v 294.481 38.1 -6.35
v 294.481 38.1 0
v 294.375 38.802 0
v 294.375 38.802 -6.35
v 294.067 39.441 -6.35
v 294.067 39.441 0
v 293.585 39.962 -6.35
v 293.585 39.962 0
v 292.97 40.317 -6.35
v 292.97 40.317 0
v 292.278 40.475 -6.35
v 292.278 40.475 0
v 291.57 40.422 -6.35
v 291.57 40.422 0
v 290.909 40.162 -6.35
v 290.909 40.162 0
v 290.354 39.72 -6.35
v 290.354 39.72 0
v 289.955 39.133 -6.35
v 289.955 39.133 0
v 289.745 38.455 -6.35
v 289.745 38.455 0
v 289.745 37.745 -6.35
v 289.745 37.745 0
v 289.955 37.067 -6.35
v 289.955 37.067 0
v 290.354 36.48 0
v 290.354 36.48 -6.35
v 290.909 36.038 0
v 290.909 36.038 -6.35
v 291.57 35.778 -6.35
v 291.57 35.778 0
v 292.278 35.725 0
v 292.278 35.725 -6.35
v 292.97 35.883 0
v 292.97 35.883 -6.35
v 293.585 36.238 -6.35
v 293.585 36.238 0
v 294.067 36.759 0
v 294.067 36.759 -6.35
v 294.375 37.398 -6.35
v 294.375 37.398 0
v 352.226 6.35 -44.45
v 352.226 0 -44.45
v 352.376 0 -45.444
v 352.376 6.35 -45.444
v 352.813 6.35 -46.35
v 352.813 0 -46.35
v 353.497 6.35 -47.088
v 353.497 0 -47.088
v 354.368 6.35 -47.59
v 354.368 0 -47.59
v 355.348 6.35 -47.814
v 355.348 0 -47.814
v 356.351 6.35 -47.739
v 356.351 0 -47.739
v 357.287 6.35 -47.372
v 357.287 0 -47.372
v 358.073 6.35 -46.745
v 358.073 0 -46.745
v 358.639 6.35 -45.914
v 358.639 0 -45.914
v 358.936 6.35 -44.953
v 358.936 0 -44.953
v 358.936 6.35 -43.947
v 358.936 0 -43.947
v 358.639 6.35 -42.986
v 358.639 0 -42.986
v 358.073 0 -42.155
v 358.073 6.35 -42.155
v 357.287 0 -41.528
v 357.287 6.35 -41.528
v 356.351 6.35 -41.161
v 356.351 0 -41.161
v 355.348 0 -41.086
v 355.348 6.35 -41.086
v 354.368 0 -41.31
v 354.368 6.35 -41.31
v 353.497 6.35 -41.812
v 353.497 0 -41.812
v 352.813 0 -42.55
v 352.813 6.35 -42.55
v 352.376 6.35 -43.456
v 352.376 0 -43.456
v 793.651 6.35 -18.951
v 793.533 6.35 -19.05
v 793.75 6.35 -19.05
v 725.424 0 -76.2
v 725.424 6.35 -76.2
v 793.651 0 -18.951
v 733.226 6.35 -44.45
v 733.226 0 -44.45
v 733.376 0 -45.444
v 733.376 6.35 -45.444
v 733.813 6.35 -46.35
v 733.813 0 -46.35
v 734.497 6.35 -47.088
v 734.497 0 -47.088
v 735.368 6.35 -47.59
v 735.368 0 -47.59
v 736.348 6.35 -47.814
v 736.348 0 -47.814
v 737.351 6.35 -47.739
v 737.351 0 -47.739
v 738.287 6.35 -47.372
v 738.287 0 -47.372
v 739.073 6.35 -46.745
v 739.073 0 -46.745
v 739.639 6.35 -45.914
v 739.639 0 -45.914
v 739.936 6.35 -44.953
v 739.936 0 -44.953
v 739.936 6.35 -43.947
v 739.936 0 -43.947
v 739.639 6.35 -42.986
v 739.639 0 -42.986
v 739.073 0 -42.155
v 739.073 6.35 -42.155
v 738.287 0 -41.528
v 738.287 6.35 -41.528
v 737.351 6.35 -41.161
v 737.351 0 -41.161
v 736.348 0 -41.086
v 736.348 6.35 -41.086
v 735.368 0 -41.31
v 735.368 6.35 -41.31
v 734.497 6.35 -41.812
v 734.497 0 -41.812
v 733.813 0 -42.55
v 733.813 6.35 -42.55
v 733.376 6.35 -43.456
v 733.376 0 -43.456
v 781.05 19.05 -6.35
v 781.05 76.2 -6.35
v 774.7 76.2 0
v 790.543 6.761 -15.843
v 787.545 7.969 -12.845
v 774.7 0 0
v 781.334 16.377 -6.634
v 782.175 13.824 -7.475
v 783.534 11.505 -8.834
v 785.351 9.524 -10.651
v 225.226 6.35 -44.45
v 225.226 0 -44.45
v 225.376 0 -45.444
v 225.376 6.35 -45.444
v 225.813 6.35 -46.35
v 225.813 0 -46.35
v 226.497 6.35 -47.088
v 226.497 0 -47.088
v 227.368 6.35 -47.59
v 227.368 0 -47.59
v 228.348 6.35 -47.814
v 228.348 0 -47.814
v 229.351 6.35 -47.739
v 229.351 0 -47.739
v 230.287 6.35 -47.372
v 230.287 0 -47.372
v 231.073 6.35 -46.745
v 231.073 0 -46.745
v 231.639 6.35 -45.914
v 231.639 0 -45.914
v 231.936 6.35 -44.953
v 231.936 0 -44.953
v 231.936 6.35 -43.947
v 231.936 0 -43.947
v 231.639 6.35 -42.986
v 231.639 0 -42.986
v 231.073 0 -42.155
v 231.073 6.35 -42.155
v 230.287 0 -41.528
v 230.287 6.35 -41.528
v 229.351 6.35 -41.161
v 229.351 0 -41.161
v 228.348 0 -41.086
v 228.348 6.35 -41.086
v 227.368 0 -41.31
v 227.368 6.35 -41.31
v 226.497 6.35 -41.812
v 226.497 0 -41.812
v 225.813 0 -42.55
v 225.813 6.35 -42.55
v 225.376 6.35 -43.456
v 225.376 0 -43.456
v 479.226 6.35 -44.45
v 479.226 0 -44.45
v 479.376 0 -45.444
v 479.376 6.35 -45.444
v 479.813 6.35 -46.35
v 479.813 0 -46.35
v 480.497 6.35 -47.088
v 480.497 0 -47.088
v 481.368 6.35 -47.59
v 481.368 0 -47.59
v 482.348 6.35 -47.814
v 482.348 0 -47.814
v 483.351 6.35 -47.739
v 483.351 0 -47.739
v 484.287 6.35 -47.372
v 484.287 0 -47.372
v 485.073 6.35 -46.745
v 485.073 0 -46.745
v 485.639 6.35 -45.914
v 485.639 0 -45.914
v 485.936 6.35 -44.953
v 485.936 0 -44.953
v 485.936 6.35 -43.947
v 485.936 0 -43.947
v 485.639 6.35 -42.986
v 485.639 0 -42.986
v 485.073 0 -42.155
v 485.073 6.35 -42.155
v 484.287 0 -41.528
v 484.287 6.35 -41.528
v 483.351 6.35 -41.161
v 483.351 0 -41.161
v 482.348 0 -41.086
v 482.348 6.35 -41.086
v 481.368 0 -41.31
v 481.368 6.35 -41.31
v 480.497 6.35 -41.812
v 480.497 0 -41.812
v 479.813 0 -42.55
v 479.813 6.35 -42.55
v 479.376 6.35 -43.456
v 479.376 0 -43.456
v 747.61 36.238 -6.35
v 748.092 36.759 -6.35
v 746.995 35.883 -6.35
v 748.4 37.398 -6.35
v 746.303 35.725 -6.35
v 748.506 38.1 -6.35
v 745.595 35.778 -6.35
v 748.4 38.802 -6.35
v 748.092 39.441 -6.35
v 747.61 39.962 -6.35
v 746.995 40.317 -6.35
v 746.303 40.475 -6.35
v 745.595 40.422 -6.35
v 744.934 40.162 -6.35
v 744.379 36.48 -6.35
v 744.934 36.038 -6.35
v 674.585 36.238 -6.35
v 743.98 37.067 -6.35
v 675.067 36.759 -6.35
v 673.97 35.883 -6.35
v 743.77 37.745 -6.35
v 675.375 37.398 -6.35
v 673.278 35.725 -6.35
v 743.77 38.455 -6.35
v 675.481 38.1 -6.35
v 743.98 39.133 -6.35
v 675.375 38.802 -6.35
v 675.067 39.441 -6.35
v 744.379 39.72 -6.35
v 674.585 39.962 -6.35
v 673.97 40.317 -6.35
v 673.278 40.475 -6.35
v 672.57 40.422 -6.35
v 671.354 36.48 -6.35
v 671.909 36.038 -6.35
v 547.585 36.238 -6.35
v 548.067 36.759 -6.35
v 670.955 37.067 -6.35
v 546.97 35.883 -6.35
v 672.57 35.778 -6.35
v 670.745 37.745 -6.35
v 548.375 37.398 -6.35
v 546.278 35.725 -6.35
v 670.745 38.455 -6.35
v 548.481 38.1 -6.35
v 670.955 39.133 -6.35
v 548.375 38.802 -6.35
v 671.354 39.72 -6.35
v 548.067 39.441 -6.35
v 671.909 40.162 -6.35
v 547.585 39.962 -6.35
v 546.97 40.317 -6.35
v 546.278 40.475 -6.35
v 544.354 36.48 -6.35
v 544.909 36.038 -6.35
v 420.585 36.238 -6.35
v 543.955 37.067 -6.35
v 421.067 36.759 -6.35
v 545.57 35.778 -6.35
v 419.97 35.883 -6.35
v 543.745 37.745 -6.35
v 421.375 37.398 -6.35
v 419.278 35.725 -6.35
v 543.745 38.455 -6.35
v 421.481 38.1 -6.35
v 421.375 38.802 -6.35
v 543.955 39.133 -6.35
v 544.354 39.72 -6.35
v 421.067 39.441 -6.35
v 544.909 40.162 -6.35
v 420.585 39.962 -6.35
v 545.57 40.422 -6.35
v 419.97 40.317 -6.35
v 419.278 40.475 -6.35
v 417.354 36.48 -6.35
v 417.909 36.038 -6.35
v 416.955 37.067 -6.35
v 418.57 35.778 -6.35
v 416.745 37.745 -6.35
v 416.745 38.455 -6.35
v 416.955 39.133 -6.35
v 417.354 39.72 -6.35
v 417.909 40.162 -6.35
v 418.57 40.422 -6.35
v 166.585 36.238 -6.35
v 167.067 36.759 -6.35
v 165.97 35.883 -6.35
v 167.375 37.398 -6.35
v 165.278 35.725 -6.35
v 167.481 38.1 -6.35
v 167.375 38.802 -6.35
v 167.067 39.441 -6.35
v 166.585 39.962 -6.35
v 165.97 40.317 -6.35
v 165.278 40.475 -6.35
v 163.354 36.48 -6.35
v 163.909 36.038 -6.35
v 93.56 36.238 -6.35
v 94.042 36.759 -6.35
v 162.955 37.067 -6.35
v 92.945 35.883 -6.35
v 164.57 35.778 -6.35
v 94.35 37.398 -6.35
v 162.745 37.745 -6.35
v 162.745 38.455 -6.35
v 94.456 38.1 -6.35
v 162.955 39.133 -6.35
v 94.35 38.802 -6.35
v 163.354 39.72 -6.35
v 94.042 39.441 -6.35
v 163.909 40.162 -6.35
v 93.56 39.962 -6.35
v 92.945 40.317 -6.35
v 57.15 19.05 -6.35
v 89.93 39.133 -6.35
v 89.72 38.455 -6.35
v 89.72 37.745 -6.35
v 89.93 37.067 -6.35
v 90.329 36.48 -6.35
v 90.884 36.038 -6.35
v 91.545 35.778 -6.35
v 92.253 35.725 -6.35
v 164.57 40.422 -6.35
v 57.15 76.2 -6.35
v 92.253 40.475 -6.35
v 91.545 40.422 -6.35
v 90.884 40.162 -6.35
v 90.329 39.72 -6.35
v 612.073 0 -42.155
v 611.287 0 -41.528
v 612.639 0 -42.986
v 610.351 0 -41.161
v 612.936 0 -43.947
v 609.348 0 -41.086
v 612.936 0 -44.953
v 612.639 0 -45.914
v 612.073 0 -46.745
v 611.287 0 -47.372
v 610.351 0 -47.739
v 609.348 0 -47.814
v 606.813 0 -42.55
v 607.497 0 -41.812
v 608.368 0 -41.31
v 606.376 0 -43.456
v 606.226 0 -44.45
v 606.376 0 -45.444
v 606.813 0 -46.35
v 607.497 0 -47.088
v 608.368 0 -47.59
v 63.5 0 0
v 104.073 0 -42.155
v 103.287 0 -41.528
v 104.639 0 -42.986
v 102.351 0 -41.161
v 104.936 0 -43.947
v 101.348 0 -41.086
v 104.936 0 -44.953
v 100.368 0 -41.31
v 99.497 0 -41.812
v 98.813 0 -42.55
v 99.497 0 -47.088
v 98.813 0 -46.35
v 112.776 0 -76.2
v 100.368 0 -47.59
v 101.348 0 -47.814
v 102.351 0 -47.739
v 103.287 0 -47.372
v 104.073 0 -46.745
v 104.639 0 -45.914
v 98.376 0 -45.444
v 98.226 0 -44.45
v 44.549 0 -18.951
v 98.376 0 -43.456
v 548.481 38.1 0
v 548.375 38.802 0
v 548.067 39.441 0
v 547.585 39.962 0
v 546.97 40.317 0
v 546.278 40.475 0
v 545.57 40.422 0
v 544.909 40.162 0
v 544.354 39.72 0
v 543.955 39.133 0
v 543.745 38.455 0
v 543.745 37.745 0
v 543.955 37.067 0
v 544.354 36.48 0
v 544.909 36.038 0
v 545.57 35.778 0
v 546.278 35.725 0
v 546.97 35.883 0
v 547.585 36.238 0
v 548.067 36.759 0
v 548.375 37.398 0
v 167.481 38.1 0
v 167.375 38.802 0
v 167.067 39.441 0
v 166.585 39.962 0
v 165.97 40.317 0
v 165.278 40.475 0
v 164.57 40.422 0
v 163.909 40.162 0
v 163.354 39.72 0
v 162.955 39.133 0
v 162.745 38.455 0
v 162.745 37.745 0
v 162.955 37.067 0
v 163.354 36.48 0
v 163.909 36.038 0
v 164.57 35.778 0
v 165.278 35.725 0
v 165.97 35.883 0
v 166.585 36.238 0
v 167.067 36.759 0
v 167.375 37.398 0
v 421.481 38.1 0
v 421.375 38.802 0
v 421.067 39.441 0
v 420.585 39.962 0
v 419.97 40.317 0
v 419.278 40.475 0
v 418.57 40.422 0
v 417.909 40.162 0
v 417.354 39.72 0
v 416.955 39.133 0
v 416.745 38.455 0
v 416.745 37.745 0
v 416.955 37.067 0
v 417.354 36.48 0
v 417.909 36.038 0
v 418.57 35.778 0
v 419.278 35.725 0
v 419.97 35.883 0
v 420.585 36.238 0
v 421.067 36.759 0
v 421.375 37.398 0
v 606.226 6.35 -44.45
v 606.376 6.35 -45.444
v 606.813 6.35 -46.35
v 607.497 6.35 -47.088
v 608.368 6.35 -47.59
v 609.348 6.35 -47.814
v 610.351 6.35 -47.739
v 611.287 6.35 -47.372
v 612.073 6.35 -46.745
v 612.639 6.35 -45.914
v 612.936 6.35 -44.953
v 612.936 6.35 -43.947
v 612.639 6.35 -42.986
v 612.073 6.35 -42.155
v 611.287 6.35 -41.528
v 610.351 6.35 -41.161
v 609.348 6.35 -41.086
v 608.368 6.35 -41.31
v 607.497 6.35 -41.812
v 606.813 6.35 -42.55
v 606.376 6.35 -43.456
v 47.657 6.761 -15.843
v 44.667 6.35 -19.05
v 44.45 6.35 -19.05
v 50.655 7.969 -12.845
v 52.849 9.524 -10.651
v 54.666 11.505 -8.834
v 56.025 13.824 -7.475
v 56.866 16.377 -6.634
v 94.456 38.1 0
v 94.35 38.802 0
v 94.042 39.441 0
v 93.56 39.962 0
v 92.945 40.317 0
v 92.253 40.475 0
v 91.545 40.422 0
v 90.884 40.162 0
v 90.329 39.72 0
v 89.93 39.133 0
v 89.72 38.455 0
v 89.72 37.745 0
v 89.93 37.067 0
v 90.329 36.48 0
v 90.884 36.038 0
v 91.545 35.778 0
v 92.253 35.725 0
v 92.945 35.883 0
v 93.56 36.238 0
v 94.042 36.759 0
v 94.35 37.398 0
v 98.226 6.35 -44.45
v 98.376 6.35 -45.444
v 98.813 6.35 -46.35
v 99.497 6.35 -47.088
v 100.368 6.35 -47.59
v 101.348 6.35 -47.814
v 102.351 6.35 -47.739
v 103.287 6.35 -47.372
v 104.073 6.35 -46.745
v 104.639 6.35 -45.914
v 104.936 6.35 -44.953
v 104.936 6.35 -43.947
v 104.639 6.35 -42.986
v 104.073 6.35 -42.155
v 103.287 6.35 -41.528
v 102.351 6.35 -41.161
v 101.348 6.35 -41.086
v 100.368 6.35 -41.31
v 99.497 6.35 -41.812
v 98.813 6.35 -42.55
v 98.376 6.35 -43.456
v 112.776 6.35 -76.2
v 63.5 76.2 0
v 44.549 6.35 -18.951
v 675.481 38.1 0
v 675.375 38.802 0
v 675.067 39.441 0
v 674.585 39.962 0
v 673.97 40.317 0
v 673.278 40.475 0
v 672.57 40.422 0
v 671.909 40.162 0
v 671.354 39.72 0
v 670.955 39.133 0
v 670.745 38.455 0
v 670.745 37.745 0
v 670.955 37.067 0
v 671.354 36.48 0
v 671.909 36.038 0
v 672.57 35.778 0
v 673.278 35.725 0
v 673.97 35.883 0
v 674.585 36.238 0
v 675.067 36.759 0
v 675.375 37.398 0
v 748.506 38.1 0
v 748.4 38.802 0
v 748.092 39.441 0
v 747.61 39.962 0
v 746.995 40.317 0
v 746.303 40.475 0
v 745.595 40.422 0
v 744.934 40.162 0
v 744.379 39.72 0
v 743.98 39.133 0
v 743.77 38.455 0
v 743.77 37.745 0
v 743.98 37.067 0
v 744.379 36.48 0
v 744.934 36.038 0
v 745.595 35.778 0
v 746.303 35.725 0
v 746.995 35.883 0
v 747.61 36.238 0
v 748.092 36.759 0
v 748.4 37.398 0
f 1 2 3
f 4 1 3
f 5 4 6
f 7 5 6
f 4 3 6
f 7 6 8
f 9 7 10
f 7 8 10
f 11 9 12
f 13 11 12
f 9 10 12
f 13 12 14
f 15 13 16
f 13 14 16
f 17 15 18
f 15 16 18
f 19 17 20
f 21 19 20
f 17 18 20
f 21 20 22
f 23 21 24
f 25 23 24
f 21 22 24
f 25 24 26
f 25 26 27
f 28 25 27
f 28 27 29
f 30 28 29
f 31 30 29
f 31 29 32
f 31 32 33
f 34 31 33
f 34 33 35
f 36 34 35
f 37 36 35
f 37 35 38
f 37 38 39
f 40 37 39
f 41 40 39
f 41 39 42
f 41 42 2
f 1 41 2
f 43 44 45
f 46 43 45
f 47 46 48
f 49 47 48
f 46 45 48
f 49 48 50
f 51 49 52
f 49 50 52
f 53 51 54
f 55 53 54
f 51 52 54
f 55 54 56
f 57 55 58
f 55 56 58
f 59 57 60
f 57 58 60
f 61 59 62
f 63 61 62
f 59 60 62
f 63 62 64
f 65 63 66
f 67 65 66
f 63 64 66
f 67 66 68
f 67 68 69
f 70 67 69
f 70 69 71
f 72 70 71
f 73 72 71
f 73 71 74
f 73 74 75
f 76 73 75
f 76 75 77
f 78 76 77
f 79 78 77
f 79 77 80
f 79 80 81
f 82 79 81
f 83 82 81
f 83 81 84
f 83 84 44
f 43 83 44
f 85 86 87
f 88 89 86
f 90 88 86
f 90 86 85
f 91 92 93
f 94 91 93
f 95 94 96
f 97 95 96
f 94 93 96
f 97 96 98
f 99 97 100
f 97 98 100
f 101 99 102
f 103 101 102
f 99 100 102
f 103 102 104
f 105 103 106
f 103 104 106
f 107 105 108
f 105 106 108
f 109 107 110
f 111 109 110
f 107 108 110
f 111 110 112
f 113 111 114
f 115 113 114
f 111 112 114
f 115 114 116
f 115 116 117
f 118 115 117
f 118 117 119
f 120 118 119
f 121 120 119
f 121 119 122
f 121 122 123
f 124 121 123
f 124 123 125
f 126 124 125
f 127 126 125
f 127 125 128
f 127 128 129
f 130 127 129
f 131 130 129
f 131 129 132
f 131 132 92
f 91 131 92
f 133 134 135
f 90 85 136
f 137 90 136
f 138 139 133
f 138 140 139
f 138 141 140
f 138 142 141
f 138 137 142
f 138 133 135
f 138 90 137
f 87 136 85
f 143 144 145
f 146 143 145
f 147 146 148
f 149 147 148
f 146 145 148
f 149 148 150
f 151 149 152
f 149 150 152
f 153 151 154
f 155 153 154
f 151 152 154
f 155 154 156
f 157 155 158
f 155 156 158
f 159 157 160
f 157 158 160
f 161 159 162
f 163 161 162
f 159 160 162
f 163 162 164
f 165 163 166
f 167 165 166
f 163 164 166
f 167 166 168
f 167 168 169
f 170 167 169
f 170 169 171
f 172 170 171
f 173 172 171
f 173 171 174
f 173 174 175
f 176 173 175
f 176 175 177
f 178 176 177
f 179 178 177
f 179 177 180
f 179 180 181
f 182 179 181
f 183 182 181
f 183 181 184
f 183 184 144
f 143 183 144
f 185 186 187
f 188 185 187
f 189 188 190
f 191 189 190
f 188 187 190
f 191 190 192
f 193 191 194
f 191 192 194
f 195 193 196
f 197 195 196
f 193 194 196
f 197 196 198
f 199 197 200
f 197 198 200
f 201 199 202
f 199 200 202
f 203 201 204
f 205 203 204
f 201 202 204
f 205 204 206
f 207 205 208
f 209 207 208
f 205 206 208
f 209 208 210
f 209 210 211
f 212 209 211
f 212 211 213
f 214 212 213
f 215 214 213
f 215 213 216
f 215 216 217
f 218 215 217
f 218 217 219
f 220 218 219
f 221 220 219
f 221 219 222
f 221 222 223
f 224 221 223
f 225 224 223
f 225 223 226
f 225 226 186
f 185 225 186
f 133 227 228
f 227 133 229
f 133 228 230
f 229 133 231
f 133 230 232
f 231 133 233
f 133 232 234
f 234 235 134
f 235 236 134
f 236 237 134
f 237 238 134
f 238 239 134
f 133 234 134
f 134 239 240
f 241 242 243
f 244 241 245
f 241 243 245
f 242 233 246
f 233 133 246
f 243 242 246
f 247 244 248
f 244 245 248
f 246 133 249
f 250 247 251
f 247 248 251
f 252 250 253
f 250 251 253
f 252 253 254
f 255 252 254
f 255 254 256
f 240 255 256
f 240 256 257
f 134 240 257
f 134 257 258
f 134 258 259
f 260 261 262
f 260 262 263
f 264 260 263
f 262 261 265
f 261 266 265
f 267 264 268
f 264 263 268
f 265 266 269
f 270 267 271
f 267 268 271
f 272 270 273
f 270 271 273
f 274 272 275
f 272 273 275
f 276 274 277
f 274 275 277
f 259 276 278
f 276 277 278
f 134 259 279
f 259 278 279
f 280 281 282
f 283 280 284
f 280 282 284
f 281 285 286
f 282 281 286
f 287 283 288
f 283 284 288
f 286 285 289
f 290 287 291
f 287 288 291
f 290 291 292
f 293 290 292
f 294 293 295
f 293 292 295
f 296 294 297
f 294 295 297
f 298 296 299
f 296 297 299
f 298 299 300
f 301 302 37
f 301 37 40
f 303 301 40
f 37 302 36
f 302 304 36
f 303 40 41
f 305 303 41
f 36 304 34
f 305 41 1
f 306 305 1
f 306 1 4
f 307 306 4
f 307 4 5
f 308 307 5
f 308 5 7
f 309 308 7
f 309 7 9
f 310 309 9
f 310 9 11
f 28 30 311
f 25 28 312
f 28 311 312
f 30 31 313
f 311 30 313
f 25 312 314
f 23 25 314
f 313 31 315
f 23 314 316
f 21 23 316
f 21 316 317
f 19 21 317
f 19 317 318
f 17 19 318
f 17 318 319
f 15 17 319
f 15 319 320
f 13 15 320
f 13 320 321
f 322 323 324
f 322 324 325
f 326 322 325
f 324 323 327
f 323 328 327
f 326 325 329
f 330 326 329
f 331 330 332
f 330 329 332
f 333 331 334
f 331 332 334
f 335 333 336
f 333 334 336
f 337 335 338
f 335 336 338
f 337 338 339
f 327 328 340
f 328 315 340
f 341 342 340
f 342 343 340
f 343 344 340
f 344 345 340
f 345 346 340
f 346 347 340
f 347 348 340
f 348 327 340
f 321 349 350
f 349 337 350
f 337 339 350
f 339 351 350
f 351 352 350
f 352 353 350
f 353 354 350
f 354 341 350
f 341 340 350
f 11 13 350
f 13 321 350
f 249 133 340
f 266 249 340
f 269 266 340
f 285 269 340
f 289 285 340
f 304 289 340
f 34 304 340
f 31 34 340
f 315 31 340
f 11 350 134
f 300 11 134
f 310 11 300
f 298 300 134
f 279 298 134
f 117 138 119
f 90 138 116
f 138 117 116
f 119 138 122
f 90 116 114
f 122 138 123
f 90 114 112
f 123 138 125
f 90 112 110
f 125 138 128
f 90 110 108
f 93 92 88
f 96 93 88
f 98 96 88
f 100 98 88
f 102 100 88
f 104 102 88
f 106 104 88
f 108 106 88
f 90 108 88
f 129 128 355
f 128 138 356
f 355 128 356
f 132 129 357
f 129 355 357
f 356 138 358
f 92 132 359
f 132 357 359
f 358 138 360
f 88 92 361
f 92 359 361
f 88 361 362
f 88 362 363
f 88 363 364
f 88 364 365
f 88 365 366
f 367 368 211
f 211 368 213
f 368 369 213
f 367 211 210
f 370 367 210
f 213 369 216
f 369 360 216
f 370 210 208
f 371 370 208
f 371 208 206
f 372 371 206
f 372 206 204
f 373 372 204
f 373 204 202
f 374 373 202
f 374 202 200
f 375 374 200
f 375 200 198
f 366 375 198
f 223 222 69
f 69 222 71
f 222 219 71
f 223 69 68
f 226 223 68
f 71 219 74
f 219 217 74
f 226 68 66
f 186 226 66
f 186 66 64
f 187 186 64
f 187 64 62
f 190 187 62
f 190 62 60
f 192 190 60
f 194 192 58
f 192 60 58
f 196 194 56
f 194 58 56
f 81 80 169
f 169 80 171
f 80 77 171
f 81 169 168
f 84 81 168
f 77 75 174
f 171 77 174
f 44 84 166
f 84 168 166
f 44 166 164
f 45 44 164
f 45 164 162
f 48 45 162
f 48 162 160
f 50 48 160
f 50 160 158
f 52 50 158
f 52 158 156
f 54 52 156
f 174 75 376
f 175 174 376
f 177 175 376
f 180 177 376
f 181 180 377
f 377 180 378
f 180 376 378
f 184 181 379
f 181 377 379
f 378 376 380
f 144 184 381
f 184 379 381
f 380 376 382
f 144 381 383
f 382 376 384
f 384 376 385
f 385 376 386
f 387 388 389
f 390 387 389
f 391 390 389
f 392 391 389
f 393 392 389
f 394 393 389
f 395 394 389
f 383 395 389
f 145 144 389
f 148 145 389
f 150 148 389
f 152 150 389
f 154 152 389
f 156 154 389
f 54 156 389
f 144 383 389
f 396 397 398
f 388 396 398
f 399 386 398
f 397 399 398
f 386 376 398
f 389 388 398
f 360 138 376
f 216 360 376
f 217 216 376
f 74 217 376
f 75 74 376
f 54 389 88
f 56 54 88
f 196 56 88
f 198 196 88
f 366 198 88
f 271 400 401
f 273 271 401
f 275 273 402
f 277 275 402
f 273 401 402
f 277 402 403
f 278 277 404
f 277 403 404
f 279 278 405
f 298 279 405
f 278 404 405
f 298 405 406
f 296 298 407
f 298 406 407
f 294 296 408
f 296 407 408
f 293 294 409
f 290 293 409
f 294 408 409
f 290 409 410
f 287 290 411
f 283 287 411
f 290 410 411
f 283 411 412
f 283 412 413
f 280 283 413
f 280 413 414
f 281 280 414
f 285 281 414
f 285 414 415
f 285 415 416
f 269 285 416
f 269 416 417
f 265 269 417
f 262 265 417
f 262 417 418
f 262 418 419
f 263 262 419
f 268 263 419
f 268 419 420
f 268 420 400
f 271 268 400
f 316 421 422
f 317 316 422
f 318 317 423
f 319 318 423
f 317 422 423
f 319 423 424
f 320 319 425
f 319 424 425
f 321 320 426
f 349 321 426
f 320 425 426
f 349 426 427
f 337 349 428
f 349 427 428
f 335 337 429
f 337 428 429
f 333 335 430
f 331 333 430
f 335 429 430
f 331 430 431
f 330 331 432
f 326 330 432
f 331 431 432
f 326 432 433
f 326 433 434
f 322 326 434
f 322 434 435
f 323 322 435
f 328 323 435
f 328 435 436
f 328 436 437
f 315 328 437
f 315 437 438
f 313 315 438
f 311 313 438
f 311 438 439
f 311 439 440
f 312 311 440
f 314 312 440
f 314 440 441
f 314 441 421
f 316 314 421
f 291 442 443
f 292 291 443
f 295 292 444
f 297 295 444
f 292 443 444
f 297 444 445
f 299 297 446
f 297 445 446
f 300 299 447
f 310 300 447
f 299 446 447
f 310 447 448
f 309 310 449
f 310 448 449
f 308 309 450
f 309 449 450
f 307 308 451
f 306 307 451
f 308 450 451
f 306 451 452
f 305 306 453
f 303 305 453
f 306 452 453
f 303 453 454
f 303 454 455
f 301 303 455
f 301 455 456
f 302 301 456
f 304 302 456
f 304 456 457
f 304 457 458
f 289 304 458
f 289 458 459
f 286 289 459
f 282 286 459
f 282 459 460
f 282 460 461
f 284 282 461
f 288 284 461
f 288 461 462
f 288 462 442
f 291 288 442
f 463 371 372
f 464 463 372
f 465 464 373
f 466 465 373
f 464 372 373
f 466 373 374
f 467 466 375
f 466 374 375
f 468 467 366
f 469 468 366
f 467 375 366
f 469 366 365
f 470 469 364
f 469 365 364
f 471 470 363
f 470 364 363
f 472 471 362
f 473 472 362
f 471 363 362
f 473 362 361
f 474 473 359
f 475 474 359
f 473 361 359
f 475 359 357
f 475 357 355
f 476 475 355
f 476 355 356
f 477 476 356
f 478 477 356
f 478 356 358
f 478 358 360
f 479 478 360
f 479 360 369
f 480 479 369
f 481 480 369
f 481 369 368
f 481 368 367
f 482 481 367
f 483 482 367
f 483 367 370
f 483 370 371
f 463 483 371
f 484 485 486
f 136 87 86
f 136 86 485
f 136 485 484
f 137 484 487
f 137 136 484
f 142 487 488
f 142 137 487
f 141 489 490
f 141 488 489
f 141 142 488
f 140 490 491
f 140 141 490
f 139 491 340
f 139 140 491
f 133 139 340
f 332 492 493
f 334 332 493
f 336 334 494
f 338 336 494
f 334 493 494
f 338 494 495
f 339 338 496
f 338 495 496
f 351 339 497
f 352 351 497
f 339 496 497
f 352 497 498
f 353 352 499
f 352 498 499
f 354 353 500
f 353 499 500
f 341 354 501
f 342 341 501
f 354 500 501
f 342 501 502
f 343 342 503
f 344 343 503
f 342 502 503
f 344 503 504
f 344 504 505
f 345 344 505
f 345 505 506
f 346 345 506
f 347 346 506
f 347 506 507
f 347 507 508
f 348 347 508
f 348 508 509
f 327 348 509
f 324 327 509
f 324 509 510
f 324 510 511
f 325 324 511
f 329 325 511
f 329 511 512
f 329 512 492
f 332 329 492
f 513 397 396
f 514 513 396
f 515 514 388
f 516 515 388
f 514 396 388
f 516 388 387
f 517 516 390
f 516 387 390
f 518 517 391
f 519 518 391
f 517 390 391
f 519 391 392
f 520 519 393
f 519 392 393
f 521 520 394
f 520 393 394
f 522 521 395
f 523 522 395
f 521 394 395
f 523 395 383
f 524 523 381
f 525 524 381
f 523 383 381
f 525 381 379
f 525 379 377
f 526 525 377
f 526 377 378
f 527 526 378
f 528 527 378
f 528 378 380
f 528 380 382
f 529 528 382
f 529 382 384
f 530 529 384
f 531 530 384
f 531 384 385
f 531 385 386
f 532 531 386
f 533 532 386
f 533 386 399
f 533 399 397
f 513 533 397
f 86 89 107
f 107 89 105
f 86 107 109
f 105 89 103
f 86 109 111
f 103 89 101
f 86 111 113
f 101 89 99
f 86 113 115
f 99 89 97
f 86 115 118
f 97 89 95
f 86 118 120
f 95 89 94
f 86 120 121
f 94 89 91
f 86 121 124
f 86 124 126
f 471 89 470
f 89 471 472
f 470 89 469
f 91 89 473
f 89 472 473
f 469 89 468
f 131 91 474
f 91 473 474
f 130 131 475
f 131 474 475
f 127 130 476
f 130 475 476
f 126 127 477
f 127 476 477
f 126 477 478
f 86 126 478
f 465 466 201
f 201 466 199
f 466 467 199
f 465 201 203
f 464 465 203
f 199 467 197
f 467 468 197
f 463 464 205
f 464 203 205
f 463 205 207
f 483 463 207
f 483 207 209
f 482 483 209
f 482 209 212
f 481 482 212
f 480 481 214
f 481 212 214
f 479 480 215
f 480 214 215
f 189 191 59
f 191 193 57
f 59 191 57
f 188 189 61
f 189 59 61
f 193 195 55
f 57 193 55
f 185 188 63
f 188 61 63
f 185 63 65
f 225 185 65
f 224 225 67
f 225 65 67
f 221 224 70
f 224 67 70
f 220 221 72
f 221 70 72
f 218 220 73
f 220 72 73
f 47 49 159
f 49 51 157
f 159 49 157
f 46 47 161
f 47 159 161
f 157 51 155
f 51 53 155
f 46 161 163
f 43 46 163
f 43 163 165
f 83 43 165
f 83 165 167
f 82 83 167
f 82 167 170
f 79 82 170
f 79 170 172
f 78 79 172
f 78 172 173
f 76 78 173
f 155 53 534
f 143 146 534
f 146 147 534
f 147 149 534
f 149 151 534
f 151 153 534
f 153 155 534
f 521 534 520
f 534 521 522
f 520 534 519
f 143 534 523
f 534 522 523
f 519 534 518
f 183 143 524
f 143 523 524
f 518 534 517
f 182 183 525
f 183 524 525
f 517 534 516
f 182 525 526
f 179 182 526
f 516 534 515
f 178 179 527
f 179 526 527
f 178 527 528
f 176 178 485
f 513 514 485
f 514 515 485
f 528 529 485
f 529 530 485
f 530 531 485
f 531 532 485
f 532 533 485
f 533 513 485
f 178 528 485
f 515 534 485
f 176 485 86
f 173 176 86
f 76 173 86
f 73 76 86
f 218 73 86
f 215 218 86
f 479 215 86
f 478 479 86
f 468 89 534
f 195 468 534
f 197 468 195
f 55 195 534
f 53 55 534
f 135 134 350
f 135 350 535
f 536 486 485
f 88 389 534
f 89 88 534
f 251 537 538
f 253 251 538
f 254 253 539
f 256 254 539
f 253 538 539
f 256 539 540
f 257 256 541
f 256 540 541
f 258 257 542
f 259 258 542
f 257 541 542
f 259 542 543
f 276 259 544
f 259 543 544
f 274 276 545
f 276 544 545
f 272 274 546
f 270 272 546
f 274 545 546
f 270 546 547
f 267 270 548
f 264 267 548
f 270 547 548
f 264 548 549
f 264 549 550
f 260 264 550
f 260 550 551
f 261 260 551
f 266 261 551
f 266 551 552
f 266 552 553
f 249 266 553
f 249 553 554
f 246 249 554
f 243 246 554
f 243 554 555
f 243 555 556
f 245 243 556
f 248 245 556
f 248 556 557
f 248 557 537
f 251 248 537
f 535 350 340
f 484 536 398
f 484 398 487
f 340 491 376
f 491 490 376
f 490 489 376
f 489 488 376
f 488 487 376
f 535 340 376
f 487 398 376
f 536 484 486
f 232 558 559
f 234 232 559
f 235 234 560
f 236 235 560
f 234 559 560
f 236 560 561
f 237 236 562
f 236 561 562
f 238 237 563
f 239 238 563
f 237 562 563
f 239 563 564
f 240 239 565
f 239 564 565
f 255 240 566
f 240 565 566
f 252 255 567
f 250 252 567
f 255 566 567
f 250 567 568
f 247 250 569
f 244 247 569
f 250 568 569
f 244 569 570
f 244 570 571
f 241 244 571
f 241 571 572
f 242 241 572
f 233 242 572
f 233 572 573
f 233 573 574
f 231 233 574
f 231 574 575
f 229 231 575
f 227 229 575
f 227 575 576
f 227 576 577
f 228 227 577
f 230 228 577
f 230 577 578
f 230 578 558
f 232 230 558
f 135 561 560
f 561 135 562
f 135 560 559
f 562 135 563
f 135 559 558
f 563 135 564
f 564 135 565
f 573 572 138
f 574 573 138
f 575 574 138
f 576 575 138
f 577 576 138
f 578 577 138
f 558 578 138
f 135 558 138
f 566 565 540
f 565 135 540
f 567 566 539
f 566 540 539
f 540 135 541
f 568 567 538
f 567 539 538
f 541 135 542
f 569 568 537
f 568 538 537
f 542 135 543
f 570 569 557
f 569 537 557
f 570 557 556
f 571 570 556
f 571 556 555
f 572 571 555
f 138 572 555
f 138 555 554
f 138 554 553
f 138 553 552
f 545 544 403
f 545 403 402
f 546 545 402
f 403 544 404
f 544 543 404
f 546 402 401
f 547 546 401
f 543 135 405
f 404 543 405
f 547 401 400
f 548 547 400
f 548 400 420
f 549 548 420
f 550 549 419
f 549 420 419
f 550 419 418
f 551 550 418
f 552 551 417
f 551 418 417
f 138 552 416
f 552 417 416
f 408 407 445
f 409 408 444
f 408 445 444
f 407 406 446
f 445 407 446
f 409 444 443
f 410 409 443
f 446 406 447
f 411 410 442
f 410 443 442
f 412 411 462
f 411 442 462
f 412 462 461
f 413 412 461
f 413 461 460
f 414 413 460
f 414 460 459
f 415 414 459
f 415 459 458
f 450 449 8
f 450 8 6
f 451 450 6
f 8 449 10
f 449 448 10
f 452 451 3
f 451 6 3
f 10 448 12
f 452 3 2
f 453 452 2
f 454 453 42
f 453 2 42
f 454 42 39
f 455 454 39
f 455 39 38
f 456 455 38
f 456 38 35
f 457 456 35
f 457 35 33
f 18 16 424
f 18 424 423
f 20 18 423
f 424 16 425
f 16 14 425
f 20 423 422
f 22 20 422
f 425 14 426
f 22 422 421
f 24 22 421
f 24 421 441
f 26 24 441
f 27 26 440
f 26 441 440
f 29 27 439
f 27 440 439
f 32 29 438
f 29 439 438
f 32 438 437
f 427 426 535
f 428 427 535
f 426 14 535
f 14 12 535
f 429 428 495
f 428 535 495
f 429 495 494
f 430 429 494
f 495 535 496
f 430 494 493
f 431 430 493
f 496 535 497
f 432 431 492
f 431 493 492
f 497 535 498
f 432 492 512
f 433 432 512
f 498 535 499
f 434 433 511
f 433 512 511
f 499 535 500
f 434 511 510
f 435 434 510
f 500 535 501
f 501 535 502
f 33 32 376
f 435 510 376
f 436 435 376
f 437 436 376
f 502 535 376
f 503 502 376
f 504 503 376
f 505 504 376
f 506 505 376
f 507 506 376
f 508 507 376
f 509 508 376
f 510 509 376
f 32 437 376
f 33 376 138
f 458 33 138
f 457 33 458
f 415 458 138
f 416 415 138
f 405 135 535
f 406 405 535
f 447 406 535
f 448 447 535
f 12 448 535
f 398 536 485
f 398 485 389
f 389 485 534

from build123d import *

# Parameters (mm, degrees)
BOSS_EXTRUDE1_DEPTH              = 838.2
FILLET1_R                        = 12.7
F_17_64_0_26563_DIAMETER_HOLE1_D = 6.747002
LPATTERN1_COUNT                  = 6
LPATTERN1_PITCH                  = 127
CUT_EXTRUDE3_DEPTH               = 846.098881788
CUT_EXTRUDE4_DEPTH               = 846.098881788
CUT_EXTRUDE5_DEPTH               = 845.55
CUT_EXTRUDE6_DEPTH               = 845.55
F_3_16_0_1875_DIAMETER_HOLE1_D   = 4.7625
LPATTERN2_COUNT                  = 3
LPATTERN2_PITCH                  = 127
LPATTERN3_COUNT                  = 3
LPATTERN3_PITCH                  = 127
F_3_16_0_1875_DIAMETER_HOLE3_D   = 4.7625


with BuildPart() as part:
    # Sketch1 → Boss-Extrude1 (new body)
    with BuildSketch(Plane(origin=(0, 0, 0), x_dir=(0, 0, -1), z_dir=(1, 0, 0))):
        Polygon((0, 0), (76.2, 0), (76.2, 6.35), (6.35, 6.35), (6.35, 76.2), (0, 76.2), align=None)
    extrude(amount=BOSS_EXTRUDE1_DEPTH)

    # Fillet1
    fillet1_edges = [part.edges().sort_by_distance(p)[0] for p in [
        (419.1, 6.35, -6.35),
    ]]
    fillet(fillet1_edges, radius=FILLET1_R)

    # 17/64 (0.26563) Diameter Hole1 (through all)
    with Locations(Plane(origin=(0, 6.35, 0), x_dir=(1, 0, 0), z_dir=(0, 1, 0))):
        with Locations((101.6, 44.45)):
            f_17_64_0_26563_diameter_hole1 = Hole(F_17_64_0_26563_DIAMETER_HOLE1_D / 2)

    # LPattern1: 17/64 (0.26563) Diameter Hole1 ×6
    with Locations(*[(i * LPATTERN1_PITCH, 0, 0) for i in range(1, LPATTERN1_COUNT)]):
        add(f_17_64_0_26563_diameter_hole1, mode=Mode.SUBTRACT)

    # Sketch7 → Cut-Extrude3 (cut, through all)
    with BuildSketch(Plane.XZ):
        Polygon((63.5, 0), (-28.052450059, 0), (-28.052450059, -91.552450059), align=None)
    extrude(amount=-CUT_EXTRUDE3_DEPTH, mode=Mode.SUBTRACT)

    # Sketch8 → Cut-Extrude4 (cut, through all)
    with BuildSketch(Plane.XZ):
        Polygon((774.7, 0), (864.325160155, 0), (864.325160155, -89.625160155), align=None)
    extrude(amount=-CUT_EXTRUDE4_DEPTH, mode=Mode.SUBTRACT)

    # Sketch12 → Cut-Extrude5 (cut, through all)
    with BuildSketch(Plane(origin=(0, 6.35, 0), x_dir=(1, 0, 0), z_dir=(0, 1, 0))):
        Polygon((44.549132772, 18.950867228), (112.775992426, 76.2), (-12.7, 76.2), align=None)
    extrude(amount=-CUT_EXTRUDE5_DEPTH, mode=Mode.SUBTRACT)

    # Sketch14 → Cut-Extrude6 (cut, through all)
    with BuildSketch(Plane(origin=(0, 6.35, 0), x_dir=(1, 0, 0), z_dir=(0, 1, 0))):
        Polygon((793.650867228, 18.950867228), (850.9, 76.2), (725.424007574, 76.2), align=None)
    extrude(amount=-CUT_EXTRUDE6_DEPTH, mode=Mode.SUBTRACT)

    # 3/16 (0.1875) Diameter Hole1 (through all)
    with Locations(Plane(origin=(0, 0, -6.35), x_dir=(-1, 0, 0), z_dir=(0, 0, -1))):
        with Locations((-419.1, 38.1)):
            f_3_16_0_1875_diameter_hole1 = Hole(F_3_16_0_1875_DIAMETER_HOLE1_D / 2)

    # LPattern2: 3/16 (0.1875) Diameter Hole1 ×3
    with Locations(*[(-i * LPATTERN2_PITCH, 0, 0) for i in range(1, LPATTERN2_COUNT)]):
        add(f_3_16_0_1875_diameter_hole1, mode=Mode.SUBTRACT)

    # LPattern3: 3/16 (0.1875) Diameter Hole1 ×3
    with Locations(*[(i * LPATTERN3_PITCH, 0, 0) for i in range(1, LPATTERN3_COUNT)]):
        add(f_3_16_0_1875_diameter_hole1, mode=Mode.SUBTRACT)

    # 3/16 (0.1875) Diameter Hole3 (through all)
    with Locations(Plane(origin=(0, 0, -6.35), x_dir=(-1, 0, 0), z_dir=(0, 0, -1))):
        with Locations((-746.125, 38.1), (-92.075, 38.1)):
            Hole(F_3_16_0_1875_DIAMETER_HOLE3_D / 2)


solid = part.part
